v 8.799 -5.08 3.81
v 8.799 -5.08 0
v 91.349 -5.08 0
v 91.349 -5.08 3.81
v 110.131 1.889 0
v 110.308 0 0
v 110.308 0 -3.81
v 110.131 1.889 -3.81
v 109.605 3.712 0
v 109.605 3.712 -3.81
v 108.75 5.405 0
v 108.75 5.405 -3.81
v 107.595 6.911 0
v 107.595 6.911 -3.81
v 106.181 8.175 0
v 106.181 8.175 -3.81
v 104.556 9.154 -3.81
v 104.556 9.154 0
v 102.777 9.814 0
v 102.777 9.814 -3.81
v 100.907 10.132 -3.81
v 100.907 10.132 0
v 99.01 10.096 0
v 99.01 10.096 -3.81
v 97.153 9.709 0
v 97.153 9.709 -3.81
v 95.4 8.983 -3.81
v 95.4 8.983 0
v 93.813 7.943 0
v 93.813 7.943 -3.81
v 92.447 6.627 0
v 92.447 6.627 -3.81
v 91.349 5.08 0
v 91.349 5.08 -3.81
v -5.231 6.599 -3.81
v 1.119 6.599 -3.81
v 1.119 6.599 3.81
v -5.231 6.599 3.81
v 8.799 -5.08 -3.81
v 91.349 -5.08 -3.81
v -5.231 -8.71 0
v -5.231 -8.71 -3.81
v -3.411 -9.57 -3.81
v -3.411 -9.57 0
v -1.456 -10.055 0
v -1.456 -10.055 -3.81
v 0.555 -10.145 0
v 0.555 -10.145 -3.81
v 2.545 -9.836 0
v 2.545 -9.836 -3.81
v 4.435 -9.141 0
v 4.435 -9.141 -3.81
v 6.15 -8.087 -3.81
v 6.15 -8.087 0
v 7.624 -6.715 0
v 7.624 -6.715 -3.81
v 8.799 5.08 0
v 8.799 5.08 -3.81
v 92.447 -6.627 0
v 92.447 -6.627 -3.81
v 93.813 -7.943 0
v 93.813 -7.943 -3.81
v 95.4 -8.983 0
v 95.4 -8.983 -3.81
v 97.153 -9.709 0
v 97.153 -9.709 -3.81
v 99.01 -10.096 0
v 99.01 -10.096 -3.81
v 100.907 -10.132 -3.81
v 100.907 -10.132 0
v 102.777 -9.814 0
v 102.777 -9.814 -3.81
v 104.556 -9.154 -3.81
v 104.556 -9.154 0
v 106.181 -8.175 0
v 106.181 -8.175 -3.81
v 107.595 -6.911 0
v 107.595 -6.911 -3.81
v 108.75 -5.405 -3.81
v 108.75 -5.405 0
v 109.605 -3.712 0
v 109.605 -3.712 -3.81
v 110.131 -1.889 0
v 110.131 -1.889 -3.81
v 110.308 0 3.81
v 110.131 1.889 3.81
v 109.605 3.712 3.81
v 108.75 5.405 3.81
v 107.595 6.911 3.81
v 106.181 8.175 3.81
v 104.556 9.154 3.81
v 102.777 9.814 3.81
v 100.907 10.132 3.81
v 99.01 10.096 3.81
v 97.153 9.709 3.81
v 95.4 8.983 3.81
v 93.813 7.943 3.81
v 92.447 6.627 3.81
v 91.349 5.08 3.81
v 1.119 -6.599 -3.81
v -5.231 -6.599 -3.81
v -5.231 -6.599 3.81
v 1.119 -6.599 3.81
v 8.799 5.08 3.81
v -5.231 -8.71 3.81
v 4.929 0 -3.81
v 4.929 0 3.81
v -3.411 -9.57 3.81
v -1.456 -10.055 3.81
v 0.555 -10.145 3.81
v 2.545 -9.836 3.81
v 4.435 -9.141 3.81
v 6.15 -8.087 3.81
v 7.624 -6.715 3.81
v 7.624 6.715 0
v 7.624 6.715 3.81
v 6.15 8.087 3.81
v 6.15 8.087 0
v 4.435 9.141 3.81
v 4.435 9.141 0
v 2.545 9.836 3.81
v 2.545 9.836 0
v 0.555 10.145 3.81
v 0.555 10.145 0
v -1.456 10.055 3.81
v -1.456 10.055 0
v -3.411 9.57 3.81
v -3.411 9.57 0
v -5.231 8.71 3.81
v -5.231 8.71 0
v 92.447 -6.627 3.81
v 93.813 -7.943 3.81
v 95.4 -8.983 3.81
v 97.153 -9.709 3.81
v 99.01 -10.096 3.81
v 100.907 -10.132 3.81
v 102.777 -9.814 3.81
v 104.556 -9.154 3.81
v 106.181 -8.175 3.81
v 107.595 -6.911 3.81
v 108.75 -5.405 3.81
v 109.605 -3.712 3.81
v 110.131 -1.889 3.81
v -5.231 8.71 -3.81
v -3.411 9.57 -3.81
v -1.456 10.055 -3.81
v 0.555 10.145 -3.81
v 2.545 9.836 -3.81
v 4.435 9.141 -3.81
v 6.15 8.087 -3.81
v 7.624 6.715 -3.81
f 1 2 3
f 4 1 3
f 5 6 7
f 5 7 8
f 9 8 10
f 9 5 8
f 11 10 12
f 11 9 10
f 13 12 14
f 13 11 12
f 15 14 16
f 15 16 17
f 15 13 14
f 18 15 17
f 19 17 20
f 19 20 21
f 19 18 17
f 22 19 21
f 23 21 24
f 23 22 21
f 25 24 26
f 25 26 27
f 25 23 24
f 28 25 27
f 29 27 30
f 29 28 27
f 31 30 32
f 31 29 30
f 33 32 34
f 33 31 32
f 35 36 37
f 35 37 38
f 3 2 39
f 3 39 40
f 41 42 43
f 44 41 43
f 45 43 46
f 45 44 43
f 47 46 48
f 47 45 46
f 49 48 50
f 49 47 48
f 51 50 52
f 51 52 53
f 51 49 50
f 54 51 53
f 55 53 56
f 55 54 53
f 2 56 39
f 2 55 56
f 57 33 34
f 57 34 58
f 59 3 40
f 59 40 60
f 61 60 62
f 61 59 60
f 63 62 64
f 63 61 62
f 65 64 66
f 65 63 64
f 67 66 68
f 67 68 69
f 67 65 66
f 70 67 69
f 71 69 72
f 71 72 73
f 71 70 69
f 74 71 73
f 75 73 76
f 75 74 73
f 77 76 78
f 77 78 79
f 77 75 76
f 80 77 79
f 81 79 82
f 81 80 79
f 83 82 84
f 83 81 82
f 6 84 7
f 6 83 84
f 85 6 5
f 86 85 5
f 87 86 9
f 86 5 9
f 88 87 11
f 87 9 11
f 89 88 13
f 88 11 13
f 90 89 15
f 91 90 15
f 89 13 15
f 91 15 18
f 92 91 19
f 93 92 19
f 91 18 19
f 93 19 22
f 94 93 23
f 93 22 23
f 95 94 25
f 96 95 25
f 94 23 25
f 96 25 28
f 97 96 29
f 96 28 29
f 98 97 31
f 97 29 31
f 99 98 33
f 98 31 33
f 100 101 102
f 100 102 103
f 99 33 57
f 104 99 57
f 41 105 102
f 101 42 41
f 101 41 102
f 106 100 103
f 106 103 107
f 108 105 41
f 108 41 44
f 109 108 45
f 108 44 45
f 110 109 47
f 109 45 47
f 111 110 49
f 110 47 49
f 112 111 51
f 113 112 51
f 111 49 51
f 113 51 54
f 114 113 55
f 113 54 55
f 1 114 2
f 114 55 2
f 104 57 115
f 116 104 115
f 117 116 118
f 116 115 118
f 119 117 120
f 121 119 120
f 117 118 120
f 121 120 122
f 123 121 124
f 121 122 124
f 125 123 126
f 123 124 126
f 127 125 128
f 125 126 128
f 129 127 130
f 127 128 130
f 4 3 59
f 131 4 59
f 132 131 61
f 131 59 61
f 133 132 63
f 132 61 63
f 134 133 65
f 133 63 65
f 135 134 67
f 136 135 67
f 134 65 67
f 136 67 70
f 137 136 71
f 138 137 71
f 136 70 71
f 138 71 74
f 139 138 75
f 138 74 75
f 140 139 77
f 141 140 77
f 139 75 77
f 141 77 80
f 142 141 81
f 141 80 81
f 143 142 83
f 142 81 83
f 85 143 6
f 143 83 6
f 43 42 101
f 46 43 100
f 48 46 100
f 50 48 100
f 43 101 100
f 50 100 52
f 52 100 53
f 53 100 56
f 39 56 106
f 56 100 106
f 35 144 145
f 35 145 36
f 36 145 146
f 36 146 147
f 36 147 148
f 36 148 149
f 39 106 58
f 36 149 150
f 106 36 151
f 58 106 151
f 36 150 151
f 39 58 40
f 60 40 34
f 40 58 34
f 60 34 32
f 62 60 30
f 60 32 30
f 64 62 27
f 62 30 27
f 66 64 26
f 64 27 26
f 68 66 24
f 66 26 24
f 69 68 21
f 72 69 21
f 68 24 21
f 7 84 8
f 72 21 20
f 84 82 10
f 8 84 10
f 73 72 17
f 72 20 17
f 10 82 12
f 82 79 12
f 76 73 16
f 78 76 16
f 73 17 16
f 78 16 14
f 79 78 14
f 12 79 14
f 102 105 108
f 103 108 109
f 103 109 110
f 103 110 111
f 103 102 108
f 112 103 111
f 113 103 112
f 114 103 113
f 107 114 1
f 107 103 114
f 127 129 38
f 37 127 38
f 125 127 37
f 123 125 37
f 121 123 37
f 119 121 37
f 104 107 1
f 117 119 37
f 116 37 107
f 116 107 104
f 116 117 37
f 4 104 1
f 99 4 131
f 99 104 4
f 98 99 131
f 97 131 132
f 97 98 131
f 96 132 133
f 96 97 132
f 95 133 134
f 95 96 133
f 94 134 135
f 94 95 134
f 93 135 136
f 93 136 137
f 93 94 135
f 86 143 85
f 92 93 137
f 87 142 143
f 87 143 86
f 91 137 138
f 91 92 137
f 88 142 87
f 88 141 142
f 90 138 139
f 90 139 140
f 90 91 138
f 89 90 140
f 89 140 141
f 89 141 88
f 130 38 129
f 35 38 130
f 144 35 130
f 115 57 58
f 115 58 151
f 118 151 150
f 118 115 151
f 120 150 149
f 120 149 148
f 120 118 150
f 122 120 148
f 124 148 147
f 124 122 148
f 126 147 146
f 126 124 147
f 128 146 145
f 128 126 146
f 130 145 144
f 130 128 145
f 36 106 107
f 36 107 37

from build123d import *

# Parameters (mm, degrees)
BOSS_EXTRUDE1_DEPTH     = 3.81
CUT_EXTRUDE1_DEPTH      = 111.840048291
CUT_EXTRUDE1_DEPTH_BACK = 111.840048291


with BuildPart() as part:
    # Sketch1 → Boss-Extrude1 (new, symmetric)
    with BuildSketch(Plane.XY):
        with BuildLine():
            ThreePointArc((10.16, 0), (9.813806395, 2.629601498), (8.798818102, 5.08))
            Line((8.798818102, 5.08), (8.798818102, -5.08))
            ThreePointArc((8.798818102, -5.08), (9.813806395, -2.629601498), (10.16, 0))
        make_face()
        with BuildLine():
            Line((8.798818102, -5.08), (8.798818102, 5.08))
            ThreePointArc((8.798818102, 5.08), (-10.16, 0), (8.798818102, -5.08))
        make_face()
        with BuildLine():
            Line((91.348818102, 5.08), (8.798818102, 5.08))
            ThreePointArc((8.798818102, 5.08), (9.813806395, 2.629601498), (10.16, 0))
            ThreePointArc((10.16, 0), (9.813806395, -2.629601498), (8.798818102, -5.08))
            Line((8.798818102, -5.08), (91.348818102, -5.08))
            ThreePointArc((91.348818102, -5.08), (89.987636205, 0), (91.348818102, 5.08))
        make_face()
        with BuildLine():
            ThreePointArc((110.307636205, 0), (102.777237703, 9.813806395), (91.348818102, 5.08))
            Line((91.348818102, 5.08), (91.348818102, -5.08))
            ThreePointArc((91.348818102, -5.08), (102.777237703, -9.813806395), (110.307636205, 0))
        make_face()
        with BuildLine():
            Line((91.348818102, -5.08), (91.348818102, 5.08))
            ThreePointArc((91.348818102, 5.08), (89.987636205, 0), (91.348818102, -5.08))
        make_face()
        with BuildLine():
            ThreePointArc((110.307636205, 0), (102.777237703, 9.813806395), (91.348818102, 5.08))
            Line((91.348818102, 5.08), (91.348818102, -5.08))
            ThreePointArc((91.348818102, -5.08), (102.777237703, -9.813806395), (110.307636205, 0))
        make_face()
        with BuildLine():
            Line((91.348818102, -5.08), (91.348818102, 5.08))
            ThreePointArc((91.348818102, 5.08), (89.987636205, 0), (91.348818102, -5.08))
        make_face()
        with BuildLine():
            ThreePointArc((10.16, 0), (9.813806395, 2.629601498), (8.798818102, 5.08))
            Line((8.798818102, 5.08), (8.798818102, -5.08))
            ThreePointArc((8.798818102, -5.08), (9.813806395, -2.629601498), (10.16, 0))
        make_face()
        with BuildLine():
            Line((8.798818102, -5.08), (8.798818102, 5.08))
            ThreePointArc((8.798818102, 5.08), (-10.16, 0), (8.798818102, -5.08))
        make_face()
    extrude(amount=BOSS_EXTRUDE1_DEPTH, both=True)

    # Sketch2 → Cut-Extrude1 (cut, two sides: drawn at the far end of the back side and taken through both)
    with BuildSketch(Plane.XY.offset(-CUT_EXTRUDE1_DEPTH_BACK)):
        Polygon((1.118947019, 6.599113577), (-5.231052981, 6.599113577), (-5.231052981, -6.599113577), (1.118947019, -6.599113577), (4.928947019, 0), align=None)
        with BuildLine():
            Line((-5.231052981, -6.599113577), (-5.231052981, 6.599113577))
            Line((-5.231052981, 6.599113577), (-6.501052981, 6.599113577))
            Line((-6.501052981, 6.599113577), (-10.156471519, 0.267742946))
            ThreePointArc((-10.156471519, 0.267742946), (-10.16, 0), (-10.156471519, -0.267742946))
            Line((-10.156471519, -0.267742946), (-6.501052981, -6.599113577))
            Line((-6.501052981, -6.599113577), (-5.231052981, -6.599113577))
        make_face()
        with BuildLine():
            Line((-5.231052981, 6.599113577), (-5.231052981, 8.709861349))
            ThreePointArc((-5.231052981, 8.709861349), (-8.775609286, 5.119988443), (-10.156471519, 0.267742946))
            Line((-10.156471519, 0.267742946), (-6.501052981, 6.599113577))
            Line((-6.501052981, 6.599113577), (-5.231052981, 6.599113577))
        make_face()
        with BuildLine():
            Line((-5.231052981, -8.709861349), (-5.231052981, -6.599113577))
            Line((-5.231052981, -6.599113577), (-6.501052981, -6.599113577))
            Line((-6.501052981, -6.599113577), (-10.156471519, -0.267742946))
            ThreePointArc((-10.156471519, -0.267742946), (-8.775609286, -5.119988443), (-5.231052981, -8.709861349))
        make_face()
    extrude(amount=CUT_EXTRUDE1_DEPTH + CUT_EXTRUDE1_DEPTH_BACK, mode=Mode.SUBTRACT)


solid = part.part
